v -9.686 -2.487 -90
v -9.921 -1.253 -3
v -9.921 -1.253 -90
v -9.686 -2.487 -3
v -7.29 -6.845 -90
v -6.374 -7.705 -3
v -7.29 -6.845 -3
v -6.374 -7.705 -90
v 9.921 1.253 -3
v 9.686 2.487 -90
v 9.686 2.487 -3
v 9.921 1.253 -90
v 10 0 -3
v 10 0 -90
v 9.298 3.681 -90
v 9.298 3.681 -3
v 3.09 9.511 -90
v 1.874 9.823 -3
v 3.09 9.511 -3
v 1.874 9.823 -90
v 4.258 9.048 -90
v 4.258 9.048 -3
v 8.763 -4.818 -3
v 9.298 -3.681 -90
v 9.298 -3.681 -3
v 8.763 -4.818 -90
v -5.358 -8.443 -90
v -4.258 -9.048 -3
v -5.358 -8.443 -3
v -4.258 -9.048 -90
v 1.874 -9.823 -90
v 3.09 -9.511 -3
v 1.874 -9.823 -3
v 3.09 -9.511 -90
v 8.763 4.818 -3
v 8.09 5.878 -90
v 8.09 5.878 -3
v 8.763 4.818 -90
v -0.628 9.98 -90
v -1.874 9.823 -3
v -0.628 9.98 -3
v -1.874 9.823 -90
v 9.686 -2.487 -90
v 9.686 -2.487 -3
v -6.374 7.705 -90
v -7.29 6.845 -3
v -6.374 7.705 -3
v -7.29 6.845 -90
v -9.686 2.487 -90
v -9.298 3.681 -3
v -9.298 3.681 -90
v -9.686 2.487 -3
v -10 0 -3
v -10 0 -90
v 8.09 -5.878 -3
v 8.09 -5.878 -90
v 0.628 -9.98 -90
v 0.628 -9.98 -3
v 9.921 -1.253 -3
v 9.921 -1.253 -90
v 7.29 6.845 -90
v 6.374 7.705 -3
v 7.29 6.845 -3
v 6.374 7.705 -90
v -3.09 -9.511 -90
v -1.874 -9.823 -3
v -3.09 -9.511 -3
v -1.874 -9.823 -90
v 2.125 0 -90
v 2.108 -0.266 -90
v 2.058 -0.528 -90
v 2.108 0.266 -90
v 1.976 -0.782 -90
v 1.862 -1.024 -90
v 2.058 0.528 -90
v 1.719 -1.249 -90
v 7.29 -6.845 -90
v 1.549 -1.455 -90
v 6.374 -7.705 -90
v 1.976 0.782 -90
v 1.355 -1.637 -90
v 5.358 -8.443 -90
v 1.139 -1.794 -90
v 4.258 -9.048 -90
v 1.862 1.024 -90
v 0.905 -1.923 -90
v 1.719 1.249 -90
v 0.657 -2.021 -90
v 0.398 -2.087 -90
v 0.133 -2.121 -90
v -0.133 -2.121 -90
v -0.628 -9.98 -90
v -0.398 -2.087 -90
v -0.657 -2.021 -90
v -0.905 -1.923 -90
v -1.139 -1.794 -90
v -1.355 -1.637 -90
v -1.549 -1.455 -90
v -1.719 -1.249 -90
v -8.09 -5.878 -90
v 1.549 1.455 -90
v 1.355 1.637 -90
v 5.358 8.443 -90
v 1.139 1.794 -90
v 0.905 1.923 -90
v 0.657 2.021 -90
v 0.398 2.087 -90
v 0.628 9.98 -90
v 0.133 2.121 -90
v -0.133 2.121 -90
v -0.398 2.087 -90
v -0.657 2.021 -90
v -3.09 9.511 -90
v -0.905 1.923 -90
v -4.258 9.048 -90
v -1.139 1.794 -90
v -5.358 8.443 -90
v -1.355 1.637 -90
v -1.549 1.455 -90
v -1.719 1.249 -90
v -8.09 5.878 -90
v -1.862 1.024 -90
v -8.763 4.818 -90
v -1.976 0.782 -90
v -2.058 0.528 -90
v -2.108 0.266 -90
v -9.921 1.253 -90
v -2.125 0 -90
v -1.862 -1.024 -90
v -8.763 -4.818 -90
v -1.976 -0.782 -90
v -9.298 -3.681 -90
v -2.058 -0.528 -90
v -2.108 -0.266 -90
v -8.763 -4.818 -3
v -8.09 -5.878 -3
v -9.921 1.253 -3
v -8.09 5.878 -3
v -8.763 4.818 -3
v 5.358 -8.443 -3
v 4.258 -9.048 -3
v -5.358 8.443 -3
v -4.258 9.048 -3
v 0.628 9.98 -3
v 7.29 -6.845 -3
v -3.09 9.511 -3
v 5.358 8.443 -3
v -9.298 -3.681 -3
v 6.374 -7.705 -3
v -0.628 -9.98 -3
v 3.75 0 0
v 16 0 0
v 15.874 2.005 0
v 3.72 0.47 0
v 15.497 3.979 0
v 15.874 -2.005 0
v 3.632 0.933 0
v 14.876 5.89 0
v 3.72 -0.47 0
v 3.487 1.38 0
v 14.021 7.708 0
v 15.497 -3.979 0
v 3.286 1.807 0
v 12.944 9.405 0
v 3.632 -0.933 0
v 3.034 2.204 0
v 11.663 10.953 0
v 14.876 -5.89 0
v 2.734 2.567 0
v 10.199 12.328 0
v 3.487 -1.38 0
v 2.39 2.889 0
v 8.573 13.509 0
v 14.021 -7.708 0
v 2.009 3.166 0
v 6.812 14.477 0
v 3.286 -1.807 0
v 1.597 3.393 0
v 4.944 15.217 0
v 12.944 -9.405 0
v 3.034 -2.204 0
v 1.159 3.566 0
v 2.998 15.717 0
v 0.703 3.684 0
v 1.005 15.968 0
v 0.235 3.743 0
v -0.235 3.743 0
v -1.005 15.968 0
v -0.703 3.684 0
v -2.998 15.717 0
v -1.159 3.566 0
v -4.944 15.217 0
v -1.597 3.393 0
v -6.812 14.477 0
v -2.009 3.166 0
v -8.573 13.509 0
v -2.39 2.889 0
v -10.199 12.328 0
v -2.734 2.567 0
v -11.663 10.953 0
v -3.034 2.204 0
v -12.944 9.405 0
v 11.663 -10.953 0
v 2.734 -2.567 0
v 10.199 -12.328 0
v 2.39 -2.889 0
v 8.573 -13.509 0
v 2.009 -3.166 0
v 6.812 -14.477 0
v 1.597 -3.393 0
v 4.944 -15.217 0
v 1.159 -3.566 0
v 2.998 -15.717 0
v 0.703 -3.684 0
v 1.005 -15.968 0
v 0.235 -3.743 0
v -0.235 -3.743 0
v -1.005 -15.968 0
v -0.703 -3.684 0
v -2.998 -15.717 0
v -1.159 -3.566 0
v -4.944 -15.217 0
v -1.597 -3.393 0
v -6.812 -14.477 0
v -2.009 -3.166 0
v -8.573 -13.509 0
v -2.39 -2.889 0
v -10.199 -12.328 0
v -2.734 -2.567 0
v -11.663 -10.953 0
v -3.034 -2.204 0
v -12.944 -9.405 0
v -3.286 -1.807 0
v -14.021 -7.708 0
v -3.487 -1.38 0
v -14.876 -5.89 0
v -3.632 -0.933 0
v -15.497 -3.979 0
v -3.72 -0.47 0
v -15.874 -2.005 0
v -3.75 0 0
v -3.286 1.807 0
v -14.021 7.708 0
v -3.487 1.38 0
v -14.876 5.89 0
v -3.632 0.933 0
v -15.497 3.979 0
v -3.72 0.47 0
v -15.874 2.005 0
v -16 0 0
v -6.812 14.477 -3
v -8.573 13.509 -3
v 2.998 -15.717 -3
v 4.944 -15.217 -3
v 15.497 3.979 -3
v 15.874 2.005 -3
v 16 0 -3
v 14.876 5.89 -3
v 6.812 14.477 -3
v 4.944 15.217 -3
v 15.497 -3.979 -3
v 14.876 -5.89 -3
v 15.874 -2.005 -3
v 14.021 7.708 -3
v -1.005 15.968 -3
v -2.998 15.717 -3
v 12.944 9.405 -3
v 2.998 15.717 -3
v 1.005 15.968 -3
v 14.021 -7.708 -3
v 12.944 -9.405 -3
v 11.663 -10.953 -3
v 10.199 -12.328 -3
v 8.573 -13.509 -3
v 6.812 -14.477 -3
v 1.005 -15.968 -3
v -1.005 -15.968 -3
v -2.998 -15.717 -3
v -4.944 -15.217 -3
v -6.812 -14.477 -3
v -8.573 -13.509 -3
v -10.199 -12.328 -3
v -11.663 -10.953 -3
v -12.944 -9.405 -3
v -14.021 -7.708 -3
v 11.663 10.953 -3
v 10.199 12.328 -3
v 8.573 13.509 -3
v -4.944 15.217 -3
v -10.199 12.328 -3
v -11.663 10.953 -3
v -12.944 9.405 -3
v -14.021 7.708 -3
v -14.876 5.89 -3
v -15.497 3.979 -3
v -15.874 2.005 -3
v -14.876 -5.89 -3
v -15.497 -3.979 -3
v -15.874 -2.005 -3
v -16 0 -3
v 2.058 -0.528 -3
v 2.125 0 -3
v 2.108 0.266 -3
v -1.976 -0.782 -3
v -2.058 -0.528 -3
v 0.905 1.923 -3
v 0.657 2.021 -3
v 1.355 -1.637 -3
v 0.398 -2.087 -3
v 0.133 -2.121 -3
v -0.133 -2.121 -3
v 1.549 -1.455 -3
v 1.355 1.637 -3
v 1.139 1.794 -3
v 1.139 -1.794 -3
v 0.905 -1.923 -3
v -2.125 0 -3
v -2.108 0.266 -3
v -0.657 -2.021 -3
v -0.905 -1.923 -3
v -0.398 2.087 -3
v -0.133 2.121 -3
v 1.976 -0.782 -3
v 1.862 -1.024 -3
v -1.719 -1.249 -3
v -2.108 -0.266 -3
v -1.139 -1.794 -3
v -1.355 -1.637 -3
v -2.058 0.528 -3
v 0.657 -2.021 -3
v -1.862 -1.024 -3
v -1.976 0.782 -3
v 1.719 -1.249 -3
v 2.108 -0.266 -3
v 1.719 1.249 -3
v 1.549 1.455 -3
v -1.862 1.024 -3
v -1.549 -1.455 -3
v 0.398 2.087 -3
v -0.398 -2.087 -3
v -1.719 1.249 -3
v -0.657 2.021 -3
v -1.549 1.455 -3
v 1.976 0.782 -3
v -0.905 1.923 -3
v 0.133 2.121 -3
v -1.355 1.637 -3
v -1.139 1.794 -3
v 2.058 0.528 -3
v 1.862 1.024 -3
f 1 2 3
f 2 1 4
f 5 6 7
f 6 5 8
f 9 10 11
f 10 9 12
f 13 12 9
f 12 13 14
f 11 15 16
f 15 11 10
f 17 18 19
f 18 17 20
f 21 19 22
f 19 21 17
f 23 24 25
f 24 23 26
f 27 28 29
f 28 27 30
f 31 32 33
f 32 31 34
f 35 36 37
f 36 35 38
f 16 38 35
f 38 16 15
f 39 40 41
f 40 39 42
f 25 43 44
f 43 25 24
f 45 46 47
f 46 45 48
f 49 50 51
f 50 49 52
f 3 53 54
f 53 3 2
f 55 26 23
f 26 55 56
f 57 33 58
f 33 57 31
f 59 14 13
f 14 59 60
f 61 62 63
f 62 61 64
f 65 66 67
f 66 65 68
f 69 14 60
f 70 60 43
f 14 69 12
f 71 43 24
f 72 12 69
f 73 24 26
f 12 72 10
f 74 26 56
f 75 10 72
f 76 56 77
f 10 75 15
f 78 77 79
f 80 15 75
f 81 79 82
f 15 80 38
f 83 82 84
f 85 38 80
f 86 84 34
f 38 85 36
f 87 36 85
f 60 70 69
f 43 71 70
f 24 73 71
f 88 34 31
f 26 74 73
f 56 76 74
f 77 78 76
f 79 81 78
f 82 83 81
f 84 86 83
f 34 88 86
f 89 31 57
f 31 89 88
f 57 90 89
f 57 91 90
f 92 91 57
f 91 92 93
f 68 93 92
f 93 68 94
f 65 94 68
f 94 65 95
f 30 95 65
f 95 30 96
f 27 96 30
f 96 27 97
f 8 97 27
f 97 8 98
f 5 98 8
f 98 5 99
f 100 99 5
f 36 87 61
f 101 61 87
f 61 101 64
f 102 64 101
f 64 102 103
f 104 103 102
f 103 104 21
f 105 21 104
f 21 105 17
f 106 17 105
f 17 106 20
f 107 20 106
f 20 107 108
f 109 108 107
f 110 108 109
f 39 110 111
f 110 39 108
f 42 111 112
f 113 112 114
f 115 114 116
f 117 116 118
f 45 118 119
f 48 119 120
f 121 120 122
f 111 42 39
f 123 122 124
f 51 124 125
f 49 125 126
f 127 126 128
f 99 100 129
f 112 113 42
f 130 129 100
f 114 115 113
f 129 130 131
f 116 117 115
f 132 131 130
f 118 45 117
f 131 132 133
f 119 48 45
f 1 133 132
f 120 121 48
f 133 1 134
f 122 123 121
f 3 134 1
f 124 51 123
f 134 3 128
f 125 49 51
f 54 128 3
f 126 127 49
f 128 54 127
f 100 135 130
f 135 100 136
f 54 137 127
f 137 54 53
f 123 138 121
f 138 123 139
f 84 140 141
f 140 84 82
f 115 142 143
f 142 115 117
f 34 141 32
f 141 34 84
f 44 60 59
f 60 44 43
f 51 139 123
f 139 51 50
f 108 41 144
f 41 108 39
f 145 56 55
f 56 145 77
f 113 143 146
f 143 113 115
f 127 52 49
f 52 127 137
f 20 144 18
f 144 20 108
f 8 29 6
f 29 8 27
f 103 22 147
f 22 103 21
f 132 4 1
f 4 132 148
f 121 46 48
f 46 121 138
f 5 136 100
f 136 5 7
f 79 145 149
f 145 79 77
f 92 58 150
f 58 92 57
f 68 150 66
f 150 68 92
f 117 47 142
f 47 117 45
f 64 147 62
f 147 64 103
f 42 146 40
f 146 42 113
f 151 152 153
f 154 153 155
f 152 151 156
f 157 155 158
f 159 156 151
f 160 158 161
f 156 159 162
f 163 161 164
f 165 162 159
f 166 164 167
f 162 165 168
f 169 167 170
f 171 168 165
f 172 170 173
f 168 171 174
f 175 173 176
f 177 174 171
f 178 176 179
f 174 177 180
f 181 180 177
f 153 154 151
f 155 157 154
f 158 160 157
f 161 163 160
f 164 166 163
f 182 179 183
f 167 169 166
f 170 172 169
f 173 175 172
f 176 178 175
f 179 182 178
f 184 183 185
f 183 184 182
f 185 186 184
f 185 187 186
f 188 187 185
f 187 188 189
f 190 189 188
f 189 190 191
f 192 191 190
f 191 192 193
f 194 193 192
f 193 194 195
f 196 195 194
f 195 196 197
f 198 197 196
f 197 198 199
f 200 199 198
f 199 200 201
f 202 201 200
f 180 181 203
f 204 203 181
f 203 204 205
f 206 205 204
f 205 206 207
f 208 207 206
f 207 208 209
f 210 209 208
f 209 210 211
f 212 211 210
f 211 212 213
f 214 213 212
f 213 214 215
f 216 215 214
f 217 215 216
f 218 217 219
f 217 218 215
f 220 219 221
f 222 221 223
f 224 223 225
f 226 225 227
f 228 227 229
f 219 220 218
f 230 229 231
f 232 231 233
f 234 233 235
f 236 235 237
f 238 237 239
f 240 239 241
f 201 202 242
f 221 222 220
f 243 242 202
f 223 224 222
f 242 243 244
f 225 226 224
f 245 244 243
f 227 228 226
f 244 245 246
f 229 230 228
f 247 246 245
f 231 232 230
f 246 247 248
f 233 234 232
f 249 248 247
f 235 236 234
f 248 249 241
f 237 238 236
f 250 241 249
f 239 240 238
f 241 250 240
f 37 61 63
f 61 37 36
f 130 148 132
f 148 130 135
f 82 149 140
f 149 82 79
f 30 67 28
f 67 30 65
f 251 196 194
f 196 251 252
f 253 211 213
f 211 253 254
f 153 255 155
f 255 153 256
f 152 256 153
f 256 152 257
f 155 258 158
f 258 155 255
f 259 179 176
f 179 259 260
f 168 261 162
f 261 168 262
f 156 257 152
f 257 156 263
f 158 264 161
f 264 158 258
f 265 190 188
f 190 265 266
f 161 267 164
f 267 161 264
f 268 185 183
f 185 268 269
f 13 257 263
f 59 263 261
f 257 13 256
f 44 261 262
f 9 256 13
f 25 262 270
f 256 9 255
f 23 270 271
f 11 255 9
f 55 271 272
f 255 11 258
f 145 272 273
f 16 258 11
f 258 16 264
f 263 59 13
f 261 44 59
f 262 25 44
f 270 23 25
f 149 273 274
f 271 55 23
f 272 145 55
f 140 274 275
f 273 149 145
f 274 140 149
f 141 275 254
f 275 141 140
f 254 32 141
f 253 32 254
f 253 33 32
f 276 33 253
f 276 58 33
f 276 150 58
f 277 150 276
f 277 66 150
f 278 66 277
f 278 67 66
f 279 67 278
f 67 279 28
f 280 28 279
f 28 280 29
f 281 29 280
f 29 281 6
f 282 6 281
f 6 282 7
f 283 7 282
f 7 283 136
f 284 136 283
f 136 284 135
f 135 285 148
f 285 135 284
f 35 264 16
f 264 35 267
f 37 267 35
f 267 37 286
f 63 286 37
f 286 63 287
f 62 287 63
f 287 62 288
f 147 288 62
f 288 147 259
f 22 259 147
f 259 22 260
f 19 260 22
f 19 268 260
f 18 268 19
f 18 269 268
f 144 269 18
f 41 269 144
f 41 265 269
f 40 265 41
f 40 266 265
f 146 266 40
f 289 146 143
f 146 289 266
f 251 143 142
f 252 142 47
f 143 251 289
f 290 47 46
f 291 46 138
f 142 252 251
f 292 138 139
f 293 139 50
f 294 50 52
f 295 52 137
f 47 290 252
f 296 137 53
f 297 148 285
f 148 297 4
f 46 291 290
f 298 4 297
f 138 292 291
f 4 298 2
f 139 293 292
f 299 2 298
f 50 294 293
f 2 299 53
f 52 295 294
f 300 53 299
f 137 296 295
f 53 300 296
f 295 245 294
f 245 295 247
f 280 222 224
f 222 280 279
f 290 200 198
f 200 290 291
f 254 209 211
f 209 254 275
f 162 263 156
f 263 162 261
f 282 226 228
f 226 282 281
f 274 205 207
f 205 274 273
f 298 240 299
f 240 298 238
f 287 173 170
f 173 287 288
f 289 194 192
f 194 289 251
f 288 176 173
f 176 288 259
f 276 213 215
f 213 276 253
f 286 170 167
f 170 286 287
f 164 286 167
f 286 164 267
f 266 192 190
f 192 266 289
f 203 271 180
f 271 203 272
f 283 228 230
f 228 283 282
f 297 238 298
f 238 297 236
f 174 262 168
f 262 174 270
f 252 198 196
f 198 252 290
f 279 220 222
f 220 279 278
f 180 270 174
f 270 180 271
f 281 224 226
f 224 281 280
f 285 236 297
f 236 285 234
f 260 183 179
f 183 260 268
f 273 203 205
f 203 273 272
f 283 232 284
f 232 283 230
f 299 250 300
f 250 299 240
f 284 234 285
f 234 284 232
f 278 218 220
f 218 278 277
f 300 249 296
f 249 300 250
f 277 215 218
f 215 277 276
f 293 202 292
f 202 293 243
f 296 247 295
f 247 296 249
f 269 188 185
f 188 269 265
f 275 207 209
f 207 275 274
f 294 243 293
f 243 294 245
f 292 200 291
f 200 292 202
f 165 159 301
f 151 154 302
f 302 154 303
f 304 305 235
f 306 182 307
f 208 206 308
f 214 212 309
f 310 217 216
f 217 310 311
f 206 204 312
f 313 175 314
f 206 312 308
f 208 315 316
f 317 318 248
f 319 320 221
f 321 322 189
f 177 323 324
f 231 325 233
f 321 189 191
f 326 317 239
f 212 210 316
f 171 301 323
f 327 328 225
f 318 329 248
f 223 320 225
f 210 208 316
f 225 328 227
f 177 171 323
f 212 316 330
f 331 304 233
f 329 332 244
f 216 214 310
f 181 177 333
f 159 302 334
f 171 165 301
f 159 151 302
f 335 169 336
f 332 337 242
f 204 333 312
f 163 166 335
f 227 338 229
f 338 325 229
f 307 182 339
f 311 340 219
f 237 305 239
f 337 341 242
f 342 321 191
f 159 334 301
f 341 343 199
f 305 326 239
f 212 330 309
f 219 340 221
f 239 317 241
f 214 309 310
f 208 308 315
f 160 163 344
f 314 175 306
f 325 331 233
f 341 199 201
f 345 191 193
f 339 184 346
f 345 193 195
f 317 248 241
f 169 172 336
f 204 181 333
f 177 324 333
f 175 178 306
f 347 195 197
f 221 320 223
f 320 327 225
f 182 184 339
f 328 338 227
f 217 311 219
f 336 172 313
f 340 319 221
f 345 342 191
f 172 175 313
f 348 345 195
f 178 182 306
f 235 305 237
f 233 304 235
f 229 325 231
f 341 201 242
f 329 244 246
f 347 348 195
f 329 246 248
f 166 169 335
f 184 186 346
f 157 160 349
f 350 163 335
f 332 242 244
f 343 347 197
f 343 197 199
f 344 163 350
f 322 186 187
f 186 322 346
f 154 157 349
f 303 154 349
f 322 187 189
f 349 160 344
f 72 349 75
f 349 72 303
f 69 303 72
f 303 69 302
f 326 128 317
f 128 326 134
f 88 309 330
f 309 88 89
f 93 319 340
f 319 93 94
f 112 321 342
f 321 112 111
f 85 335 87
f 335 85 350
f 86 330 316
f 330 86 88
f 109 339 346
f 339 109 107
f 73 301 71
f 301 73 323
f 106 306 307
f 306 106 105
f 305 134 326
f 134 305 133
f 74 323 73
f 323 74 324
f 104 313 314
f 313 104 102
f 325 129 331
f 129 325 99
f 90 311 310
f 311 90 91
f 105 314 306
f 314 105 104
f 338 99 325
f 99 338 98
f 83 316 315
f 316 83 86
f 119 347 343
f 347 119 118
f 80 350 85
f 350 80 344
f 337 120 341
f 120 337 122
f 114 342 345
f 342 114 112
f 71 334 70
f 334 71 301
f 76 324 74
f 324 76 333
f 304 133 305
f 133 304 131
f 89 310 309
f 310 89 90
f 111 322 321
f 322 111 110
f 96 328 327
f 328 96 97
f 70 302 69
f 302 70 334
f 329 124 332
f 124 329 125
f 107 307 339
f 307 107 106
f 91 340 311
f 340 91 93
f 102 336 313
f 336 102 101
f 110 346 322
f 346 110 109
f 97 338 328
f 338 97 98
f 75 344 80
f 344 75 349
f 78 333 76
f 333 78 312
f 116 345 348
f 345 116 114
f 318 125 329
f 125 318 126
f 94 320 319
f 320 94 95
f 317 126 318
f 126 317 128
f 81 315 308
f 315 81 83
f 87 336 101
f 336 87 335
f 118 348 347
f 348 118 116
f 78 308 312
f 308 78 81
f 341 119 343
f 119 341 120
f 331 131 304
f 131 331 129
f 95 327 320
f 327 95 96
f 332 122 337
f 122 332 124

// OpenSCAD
$fn = 50;


difference() {
	union() {
		translate(v = [0, 0, -90.0000000000]) {
			cylinder(h = 90, r = 10.0000000000);
		}
		translate(v = [0, 0, -3.0000000000]) {
			cylinder(h = 3, r = 16.0000000000);
		}
	}
	union() {
		translate(v = [0, 0, 0]) {
			rotate(a = [0, 0, 0]) {
				difference() {
					union() {
						#translate(v = [0, 0, -90.0000000000]) {
							cylinder(h = 90, r = 2.0000000000);
						}
						#translate(v = [0, 0, -3]) {
							cylinder(h = 3, r1 = 2.1250000000, r2 = 3.7500000000);
						}
						#translate(v = [0, 0, -90.0000000000]) {
							cylinder(h = 90, r = 2.1250000000);
						}
						#translate(v = [0, 0, -90.0000000000]) {
							cylinder(h = 90, r = 2.0000000000);
						}
					}
					union();
				}
			}
		}
	}
}
